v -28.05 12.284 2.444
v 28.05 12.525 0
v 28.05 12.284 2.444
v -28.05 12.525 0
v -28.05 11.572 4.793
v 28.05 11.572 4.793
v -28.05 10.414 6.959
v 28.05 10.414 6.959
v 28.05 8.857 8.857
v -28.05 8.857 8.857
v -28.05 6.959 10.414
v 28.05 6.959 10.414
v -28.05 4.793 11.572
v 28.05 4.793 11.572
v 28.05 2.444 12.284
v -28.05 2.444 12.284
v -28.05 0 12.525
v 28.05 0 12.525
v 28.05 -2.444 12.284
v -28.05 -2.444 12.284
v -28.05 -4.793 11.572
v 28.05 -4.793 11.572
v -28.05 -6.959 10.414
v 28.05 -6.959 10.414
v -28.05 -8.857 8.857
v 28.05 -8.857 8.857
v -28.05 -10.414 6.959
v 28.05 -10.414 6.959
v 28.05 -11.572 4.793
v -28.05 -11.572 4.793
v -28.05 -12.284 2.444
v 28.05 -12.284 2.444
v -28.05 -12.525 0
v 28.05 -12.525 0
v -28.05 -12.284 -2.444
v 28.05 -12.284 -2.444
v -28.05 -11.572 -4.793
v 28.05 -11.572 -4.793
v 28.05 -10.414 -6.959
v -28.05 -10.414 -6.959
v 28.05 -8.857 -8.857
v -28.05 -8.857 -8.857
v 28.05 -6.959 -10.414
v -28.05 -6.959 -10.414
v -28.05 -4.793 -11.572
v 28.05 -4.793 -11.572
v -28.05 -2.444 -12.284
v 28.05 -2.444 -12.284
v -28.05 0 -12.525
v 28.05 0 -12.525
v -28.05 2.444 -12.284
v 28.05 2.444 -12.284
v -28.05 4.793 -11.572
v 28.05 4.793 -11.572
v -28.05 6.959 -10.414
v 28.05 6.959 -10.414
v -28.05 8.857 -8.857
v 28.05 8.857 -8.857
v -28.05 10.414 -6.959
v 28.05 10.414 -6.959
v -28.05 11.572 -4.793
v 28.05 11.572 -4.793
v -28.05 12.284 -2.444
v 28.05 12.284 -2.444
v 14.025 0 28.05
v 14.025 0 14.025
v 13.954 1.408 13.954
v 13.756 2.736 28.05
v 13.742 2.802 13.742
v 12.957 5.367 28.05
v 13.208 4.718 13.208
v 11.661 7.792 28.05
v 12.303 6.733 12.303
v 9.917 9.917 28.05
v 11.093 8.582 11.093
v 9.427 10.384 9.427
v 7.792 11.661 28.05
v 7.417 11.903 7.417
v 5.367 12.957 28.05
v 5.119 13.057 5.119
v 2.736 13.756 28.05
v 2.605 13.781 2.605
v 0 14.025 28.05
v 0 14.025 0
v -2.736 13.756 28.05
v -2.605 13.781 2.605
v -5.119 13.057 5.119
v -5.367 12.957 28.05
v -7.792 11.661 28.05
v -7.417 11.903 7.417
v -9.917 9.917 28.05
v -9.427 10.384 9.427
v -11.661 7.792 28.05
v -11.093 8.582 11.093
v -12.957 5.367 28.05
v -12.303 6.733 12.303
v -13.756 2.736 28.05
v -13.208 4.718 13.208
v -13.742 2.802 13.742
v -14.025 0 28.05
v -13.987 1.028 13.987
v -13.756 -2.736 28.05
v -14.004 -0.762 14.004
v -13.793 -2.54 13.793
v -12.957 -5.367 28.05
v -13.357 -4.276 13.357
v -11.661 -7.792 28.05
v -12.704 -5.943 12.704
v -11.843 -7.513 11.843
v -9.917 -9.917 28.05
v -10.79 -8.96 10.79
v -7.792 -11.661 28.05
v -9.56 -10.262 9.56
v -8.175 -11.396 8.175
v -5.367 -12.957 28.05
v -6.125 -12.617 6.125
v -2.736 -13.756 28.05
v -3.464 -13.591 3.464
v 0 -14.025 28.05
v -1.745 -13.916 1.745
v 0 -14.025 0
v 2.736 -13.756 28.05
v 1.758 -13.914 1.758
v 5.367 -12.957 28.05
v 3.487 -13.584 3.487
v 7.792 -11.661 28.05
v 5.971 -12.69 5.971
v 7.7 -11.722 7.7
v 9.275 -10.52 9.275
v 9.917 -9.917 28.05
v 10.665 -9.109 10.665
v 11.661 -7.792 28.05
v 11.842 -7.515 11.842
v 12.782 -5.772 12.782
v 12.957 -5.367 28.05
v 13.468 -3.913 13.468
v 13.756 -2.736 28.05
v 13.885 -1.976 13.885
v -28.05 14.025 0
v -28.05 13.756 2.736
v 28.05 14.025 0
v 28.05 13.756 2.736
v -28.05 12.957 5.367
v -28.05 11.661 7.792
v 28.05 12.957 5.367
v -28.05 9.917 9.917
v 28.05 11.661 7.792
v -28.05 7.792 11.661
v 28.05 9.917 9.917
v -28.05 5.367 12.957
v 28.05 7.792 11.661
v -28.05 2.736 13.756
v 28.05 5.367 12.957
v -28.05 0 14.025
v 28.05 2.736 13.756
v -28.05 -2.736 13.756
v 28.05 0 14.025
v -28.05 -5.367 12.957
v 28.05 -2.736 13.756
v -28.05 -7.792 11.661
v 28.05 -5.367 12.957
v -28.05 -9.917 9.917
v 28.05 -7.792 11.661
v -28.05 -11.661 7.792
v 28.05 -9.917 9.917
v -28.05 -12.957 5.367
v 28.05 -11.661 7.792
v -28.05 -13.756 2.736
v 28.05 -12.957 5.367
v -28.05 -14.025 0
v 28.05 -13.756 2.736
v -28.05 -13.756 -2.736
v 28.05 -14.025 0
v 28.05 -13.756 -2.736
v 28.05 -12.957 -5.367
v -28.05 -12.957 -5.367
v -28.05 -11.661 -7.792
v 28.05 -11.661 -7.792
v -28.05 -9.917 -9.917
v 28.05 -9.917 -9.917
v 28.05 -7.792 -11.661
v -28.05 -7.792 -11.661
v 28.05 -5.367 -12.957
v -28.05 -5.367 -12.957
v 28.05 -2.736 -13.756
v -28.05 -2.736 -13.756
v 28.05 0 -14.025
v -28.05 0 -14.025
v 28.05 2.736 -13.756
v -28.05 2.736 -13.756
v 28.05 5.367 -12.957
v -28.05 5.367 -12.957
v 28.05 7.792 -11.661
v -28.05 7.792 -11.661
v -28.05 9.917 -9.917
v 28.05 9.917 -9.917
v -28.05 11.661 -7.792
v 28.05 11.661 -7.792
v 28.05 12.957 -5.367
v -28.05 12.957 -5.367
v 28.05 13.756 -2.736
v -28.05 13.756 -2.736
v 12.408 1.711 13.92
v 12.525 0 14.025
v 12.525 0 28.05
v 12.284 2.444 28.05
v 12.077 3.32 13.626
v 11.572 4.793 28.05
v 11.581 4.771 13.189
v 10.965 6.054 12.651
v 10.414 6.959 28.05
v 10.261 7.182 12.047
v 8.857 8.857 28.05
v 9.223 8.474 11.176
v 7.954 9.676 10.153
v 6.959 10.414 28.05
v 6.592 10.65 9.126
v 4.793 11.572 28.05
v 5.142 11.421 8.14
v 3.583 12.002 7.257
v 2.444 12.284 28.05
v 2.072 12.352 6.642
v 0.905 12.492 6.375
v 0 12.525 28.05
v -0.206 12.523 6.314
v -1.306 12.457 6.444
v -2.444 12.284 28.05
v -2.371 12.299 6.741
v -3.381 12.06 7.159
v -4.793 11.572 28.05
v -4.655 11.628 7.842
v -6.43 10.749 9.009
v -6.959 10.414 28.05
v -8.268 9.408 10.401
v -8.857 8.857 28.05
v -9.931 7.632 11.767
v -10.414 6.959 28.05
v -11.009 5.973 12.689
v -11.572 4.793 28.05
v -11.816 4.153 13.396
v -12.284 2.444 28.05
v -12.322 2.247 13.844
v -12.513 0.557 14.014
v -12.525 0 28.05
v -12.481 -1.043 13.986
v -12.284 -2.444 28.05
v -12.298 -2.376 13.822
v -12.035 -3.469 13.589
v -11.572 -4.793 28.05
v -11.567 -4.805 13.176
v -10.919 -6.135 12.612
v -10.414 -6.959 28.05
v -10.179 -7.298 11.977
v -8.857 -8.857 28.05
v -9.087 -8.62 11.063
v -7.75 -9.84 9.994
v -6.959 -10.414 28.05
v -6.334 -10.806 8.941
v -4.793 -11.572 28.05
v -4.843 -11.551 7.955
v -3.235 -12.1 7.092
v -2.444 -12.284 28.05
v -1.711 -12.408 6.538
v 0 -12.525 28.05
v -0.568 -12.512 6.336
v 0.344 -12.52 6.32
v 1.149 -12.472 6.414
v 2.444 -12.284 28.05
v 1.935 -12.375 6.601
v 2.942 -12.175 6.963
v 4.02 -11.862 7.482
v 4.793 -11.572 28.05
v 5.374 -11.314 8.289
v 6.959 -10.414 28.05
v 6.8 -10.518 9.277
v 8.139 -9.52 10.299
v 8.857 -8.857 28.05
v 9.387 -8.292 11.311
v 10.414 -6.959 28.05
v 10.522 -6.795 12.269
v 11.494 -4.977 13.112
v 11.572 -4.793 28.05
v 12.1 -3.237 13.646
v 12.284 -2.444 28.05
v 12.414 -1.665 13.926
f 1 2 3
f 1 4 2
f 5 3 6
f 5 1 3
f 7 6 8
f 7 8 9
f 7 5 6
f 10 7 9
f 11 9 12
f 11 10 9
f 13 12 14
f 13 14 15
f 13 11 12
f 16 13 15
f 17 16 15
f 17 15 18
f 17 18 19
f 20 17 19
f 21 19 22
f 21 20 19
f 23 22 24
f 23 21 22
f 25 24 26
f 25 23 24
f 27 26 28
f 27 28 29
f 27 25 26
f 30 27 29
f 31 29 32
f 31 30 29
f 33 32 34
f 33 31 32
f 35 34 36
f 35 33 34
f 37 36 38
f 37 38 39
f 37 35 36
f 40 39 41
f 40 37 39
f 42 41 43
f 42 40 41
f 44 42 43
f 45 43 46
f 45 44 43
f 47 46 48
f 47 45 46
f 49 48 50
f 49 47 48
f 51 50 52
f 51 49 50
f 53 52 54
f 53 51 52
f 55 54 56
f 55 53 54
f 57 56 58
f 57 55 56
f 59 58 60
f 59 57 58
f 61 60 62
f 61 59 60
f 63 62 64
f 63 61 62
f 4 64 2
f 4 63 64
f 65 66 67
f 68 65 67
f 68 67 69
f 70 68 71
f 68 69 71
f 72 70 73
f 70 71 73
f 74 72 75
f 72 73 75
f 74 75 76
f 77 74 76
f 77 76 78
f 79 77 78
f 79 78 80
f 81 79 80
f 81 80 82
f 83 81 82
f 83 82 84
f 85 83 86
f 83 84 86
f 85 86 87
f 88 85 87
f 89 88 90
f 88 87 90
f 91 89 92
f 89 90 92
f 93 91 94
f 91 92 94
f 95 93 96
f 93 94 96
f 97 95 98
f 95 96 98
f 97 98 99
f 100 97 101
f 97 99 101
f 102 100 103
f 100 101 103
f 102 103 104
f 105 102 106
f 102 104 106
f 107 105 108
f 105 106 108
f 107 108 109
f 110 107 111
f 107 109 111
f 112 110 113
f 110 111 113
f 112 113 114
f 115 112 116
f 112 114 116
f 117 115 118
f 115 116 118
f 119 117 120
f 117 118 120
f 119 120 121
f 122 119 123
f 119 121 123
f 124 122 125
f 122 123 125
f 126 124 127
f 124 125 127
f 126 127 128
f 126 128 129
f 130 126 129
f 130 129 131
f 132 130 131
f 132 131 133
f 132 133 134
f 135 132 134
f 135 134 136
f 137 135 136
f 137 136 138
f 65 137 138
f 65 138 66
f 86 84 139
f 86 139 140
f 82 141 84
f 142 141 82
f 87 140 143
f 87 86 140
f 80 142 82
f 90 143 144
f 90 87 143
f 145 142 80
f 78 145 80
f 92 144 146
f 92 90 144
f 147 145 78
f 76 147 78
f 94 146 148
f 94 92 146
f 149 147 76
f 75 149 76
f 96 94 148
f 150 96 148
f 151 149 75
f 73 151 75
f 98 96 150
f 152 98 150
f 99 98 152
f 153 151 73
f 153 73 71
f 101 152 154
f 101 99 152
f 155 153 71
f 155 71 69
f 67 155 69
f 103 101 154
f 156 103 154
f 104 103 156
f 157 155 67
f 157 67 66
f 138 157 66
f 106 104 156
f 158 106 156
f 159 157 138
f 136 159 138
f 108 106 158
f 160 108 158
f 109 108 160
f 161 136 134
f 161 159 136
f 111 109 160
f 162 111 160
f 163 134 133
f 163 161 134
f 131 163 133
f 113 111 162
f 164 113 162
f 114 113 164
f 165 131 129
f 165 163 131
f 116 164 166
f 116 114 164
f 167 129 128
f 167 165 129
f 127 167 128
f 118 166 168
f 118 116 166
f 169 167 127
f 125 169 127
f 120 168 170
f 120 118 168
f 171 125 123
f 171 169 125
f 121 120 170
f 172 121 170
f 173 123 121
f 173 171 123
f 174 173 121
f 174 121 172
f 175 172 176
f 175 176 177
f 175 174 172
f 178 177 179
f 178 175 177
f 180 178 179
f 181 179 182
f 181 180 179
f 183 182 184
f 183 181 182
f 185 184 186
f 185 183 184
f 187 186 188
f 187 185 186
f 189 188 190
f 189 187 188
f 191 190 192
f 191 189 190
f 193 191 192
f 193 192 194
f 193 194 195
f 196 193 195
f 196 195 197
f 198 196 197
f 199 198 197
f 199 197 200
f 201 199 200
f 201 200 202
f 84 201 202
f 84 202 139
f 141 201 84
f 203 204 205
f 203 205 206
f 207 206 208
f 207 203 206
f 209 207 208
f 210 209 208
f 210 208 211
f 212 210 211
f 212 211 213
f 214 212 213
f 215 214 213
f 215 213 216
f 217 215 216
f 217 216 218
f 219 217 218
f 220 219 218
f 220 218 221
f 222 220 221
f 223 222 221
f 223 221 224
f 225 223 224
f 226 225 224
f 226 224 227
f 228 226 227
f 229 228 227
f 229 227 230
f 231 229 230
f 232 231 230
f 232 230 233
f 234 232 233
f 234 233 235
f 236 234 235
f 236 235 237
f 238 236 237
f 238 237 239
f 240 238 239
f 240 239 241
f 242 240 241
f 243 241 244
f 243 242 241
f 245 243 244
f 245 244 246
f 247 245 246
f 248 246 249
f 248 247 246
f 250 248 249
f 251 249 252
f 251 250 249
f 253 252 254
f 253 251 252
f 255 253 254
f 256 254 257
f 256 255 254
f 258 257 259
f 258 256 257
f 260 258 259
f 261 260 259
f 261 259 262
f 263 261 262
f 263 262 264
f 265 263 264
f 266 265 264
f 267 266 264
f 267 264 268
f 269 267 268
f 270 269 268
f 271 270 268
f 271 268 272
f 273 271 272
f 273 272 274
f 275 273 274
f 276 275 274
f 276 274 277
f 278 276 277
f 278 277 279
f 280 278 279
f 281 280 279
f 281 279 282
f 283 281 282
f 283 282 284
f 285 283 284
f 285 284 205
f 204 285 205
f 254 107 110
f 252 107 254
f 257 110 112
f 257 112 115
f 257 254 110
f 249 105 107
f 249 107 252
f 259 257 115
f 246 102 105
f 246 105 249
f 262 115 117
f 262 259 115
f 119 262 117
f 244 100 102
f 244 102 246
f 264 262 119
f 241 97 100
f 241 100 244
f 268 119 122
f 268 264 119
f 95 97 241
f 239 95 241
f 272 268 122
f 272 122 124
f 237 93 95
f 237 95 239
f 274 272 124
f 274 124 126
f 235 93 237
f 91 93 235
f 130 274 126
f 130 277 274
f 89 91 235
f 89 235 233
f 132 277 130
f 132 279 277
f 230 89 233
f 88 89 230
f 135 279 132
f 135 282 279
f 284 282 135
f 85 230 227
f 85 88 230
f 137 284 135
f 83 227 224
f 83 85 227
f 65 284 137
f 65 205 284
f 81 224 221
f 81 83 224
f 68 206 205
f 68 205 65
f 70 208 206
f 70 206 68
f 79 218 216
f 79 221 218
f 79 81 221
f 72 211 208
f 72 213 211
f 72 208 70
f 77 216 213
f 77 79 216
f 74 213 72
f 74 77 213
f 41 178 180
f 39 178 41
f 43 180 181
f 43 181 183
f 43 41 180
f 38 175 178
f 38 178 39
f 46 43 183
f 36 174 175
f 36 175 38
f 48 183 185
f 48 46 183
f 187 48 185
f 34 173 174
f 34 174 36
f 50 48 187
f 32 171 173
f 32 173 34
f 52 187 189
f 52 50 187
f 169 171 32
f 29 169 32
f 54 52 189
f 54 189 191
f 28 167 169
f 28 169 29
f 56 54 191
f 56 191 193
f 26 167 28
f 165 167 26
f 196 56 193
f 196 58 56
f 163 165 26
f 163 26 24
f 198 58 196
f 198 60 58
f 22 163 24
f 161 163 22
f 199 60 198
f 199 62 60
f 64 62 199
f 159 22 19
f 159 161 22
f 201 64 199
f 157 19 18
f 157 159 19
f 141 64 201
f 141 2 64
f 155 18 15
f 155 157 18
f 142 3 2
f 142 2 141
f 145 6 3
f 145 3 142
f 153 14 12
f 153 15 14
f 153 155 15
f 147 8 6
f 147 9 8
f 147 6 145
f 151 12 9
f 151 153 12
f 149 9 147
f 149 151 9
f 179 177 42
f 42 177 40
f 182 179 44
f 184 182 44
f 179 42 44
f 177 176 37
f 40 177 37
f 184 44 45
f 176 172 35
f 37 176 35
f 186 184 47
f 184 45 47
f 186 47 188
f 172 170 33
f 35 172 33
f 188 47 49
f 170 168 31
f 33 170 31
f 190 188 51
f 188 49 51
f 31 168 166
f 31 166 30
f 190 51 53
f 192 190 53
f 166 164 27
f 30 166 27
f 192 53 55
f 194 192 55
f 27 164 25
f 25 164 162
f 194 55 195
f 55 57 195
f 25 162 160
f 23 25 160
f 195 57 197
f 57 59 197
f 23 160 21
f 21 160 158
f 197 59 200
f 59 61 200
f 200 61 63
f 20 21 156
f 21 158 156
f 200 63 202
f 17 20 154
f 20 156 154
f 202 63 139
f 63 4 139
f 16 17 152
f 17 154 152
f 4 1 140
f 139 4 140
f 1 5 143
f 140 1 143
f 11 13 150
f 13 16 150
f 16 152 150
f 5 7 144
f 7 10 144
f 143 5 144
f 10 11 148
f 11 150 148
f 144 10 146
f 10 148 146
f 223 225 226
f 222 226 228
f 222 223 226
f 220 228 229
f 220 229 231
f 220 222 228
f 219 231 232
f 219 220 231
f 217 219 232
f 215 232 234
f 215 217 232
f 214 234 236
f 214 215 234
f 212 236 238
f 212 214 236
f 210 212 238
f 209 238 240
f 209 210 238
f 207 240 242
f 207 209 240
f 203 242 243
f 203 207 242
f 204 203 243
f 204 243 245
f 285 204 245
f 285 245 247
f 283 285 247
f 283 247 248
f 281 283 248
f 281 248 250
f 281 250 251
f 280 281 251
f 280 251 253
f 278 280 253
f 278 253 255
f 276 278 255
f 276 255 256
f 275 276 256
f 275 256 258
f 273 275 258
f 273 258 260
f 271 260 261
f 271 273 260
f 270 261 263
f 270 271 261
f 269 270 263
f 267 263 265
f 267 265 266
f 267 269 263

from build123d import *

# Parameters (mm, degrees)
F0_R     = 14.024991
F0_R_2   = 12.524994
F1_DEPTH = 28.049982
F2_R     = 14.024991
F2_R_2   = 12.524994
F3_DEPTH = 28.049982
F4_DEPTH = 25.4


with BuildPart() as f1:
    # F0 (on Right) → F1 (new body, symmetric)
    with BuildSketch(Plane.YZ):
        Circle(F0_R)
        Circle(F0_R_2, mode=Mode.SUBTRACT)
    extrude(amount=F1_DEPTH, both=True)

    # F2 (on Top) → F3 (join)
    with BuildSketch(Plane.XY):
        Circle(F2_R)
        Circle(F2_R_2, mode=Mode.SUBTRACT)
    extrude(amount=F3_DEPTH)

    # F0 (on Right) → F4 (cut, symmetric)
    with BuildSketch(Plane.YZ):
        Circle(F0_R_2)
    extrude(amount=F4_DEPTH, both=True, mode=Mode.SUBTRACT)


solid = f1.part
